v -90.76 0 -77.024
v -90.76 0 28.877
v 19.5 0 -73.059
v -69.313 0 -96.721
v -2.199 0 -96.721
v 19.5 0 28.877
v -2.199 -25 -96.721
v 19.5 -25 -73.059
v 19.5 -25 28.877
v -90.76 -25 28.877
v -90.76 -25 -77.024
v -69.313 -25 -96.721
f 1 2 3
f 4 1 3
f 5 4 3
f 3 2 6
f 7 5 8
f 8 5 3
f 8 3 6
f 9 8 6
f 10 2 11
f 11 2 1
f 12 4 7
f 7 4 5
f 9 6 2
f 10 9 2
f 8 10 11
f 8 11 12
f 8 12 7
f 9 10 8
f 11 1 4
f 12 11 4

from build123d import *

# Parameters (mm, degrees)
F2_DEPTH = 25


with BuildPart() as f2:
    # F1 (on face) → F2 (new body)
    with BuildSketch(Plane.XZ):
        Polygon((19.5, 28.8766958117), (-90.7602548171, 28.8766958117), (-90.7602548171, -77.0238212563), (-69.3126782044, -96.7205752883), (-2.1988731881, -96.7205752883), (19.5, -73.0591952168), align=None)
    extrude(amount=F2_DEPTH)


solid = f2.part
